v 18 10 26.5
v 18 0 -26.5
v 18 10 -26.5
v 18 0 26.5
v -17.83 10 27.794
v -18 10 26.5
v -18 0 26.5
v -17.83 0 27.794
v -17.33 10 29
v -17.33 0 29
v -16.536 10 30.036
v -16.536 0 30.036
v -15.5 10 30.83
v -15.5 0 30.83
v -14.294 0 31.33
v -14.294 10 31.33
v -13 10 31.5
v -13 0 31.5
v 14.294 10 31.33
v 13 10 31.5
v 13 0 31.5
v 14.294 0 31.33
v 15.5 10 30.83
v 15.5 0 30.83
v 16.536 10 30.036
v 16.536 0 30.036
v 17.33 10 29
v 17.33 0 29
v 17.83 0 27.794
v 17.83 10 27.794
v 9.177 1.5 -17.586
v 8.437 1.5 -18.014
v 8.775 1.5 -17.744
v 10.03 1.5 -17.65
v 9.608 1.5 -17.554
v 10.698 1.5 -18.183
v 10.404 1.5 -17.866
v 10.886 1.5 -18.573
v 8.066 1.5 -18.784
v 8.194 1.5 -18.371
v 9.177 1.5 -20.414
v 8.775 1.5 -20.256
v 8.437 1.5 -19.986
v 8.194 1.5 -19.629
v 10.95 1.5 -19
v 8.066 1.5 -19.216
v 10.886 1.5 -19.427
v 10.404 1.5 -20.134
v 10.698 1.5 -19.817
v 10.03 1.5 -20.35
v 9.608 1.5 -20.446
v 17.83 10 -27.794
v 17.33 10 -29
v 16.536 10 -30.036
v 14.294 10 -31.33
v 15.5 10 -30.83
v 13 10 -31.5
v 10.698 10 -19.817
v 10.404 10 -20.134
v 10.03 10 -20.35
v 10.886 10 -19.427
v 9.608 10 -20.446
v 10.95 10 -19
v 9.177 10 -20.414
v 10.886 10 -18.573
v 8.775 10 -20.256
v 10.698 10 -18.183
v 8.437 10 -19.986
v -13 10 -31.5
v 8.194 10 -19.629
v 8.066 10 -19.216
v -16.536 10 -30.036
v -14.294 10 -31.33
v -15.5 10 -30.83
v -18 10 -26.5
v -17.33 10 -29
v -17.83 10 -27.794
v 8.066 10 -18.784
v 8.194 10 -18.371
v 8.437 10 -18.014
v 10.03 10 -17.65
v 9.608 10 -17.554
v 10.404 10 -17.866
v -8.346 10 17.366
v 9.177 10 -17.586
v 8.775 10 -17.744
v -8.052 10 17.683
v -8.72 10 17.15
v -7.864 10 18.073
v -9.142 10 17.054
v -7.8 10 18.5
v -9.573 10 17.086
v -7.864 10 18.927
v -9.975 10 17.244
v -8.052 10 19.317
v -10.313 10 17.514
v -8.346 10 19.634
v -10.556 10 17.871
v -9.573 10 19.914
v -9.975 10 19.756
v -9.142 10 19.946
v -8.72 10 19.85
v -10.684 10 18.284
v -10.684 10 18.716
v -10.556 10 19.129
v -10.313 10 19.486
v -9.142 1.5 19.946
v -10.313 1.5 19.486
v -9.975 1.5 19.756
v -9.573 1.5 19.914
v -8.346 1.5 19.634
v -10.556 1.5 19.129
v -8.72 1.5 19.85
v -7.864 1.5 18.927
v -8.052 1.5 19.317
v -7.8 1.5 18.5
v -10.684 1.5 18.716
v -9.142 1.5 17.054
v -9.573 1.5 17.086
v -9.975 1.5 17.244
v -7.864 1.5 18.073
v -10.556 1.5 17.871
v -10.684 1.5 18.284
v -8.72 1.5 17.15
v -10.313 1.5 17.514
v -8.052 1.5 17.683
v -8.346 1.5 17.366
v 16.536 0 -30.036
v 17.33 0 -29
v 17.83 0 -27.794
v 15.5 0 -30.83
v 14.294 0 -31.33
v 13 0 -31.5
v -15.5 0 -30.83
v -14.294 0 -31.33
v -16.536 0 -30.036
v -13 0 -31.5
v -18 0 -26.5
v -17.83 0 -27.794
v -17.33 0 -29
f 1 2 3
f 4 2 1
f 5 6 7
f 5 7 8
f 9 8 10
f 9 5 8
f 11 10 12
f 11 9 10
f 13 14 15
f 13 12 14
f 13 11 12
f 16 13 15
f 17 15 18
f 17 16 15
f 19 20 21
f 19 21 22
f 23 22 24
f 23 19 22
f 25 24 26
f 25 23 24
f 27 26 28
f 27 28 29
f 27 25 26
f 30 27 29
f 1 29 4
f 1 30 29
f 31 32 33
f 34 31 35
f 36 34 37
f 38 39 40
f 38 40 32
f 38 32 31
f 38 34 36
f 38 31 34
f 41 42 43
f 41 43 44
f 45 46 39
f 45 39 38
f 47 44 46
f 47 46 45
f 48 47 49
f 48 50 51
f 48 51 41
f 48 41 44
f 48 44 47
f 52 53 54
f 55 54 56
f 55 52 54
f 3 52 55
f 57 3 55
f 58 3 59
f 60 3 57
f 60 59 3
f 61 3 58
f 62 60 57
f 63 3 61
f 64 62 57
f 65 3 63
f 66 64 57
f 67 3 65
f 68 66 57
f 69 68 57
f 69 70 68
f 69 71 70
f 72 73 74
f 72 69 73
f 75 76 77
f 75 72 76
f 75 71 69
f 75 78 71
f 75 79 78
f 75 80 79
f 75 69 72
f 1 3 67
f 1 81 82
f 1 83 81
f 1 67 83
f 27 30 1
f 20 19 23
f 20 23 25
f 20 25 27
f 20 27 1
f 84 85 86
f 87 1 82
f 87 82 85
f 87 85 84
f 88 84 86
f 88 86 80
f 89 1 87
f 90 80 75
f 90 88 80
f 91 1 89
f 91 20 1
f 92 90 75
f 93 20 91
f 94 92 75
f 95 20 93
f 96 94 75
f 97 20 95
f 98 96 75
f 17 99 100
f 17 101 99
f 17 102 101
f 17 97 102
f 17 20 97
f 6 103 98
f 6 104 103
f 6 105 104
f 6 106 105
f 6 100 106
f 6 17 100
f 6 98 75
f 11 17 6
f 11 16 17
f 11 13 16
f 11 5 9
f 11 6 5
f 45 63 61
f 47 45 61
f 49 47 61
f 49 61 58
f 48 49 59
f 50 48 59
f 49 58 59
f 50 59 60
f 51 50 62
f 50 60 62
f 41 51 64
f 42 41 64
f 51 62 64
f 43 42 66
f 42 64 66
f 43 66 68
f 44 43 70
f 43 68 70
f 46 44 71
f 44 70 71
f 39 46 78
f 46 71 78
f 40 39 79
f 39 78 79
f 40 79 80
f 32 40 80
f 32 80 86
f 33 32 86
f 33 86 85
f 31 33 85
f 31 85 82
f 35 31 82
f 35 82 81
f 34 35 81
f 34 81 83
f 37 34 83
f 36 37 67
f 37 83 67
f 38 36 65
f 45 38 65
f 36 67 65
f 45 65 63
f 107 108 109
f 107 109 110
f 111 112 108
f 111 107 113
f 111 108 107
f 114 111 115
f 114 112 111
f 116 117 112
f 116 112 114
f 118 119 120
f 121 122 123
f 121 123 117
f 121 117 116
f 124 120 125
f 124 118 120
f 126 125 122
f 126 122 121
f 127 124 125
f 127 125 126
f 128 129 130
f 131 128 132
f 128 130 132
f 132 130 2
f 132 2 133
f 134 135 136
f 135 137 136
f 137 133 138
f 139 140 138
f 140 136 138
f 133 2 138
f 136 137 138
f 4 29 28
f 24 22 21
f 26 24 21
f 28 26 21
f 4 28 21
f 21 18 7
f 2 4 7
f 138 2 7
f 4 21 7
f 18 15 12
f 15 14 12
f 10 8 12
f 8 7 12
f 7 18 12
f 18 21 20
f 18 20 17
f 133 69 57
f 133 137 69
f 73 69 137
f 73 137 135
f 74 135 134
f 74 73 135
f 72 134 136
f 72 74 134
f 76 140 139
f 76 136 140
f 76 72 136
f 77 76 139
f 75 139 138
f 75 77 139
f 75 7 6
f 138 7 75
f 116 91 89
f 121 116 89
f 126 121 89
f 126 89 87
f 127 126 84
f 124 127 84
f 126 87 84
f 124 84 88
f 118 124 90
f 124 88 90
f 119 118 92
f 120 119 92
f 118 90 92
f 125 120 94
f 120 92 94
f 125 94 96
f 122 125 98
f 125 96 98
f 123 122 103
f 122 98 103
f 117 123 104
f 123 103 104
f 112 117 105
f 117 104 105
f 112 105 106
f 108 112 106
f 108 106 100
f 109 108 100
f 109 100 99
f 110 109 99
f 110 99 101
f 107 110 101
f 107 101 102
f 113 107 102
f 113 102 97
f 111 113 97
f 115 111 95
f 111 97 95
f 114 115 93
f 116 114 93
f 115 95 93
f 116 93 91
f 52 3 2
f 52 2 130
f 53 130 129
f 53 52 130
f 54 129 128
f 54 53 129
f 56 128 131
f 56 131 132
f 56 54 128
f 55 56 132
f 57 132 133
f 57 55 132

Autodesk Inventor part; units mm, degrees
ref_plane "YZ Plane" through (0, 0, 0) normal (1, 0, 0) x (0, 1, 0)
ref_plane "XZ Plane" through (0, 0, 0) normal (0, 1, 0) x (-1, 0, 0)
ref_plane "XY Plane" through (0, 0, 0) normal (0, 0, 1) x (1, 0, 0)
sketch "Esboço1" plane through (0, 0, 0) normal (0, 1, 0) x (-1, 0, 0)
  line L0 (13, 26.5) -> (-13, 26.5) construction
  line L1 (-13, 26.5) -> (-13, -26.5) construction
  line L2 (-13, -26.5) -> (13, -26.5) construction
  line L3 (13, -26.5) -> (13, 26.5) construction
  line L4 (-18, 31.5) -> (18, 31.5)
  line L5 (18, 31.5) -> (18, -31.5)
  line L6 (18, -31.5) -> (-18, -31.5)
  line L7 (-18, -31.5) -> (-18, 31.5)
  line L8 (-18, 31.5) -> (18, -31.5) construction
  line L9 (18, 31.5) -> (-18, -31.5) construction
  circle A0 centre (9.25, 18.5) radius 1.45
  circle A1 centre (-9.5, -19) radius 1.45
  point P0 (0, 0)
  dimension "d0" = 53
  dimension "d1" = 26
  dimension "d2" = 26.5
  dimension "d3" = 13
  dimension "d4" = 5
  dimension "d5" = 5
  dimension "d6" = 2.9
  dimension "d7" = 2.9
  dimension "d10" = 45
  dimension "d11" = 3.75
  dimension "d12" = 45.5
  dimension "d13" = 3.5
extrude "Extrusão1" add sketch "Esboço1" along normal blind 10 contours L4 L5 L6 L7 | A0 | A1
sketch "Esboço2" plane through (0, 10, 0) normal (0, 1, 0) x (1, 0, 0)
  circle A0 centre (-9.25, -18.5) radius 1.45 projected
  circle A1 centre (9.5, 19) radius 1.45 projected
  point P0 (0, 0)
extrude "Extrusão2" cut sketch "Esboço2" against normal blind 8.5
fillet "Arredondamento1" radius 5 4 edges at (18, 5, 31.5) (18, 5, -31.5) (-18, 5, -31.5) (-18, 5, 31.5)
equation "\"d2\" = 0.5 * d0"
equation "\"d3\" = 0.5 * d1"
equation "\"d7\" = d6"
properties part number "BASE BUCKBOOST"
